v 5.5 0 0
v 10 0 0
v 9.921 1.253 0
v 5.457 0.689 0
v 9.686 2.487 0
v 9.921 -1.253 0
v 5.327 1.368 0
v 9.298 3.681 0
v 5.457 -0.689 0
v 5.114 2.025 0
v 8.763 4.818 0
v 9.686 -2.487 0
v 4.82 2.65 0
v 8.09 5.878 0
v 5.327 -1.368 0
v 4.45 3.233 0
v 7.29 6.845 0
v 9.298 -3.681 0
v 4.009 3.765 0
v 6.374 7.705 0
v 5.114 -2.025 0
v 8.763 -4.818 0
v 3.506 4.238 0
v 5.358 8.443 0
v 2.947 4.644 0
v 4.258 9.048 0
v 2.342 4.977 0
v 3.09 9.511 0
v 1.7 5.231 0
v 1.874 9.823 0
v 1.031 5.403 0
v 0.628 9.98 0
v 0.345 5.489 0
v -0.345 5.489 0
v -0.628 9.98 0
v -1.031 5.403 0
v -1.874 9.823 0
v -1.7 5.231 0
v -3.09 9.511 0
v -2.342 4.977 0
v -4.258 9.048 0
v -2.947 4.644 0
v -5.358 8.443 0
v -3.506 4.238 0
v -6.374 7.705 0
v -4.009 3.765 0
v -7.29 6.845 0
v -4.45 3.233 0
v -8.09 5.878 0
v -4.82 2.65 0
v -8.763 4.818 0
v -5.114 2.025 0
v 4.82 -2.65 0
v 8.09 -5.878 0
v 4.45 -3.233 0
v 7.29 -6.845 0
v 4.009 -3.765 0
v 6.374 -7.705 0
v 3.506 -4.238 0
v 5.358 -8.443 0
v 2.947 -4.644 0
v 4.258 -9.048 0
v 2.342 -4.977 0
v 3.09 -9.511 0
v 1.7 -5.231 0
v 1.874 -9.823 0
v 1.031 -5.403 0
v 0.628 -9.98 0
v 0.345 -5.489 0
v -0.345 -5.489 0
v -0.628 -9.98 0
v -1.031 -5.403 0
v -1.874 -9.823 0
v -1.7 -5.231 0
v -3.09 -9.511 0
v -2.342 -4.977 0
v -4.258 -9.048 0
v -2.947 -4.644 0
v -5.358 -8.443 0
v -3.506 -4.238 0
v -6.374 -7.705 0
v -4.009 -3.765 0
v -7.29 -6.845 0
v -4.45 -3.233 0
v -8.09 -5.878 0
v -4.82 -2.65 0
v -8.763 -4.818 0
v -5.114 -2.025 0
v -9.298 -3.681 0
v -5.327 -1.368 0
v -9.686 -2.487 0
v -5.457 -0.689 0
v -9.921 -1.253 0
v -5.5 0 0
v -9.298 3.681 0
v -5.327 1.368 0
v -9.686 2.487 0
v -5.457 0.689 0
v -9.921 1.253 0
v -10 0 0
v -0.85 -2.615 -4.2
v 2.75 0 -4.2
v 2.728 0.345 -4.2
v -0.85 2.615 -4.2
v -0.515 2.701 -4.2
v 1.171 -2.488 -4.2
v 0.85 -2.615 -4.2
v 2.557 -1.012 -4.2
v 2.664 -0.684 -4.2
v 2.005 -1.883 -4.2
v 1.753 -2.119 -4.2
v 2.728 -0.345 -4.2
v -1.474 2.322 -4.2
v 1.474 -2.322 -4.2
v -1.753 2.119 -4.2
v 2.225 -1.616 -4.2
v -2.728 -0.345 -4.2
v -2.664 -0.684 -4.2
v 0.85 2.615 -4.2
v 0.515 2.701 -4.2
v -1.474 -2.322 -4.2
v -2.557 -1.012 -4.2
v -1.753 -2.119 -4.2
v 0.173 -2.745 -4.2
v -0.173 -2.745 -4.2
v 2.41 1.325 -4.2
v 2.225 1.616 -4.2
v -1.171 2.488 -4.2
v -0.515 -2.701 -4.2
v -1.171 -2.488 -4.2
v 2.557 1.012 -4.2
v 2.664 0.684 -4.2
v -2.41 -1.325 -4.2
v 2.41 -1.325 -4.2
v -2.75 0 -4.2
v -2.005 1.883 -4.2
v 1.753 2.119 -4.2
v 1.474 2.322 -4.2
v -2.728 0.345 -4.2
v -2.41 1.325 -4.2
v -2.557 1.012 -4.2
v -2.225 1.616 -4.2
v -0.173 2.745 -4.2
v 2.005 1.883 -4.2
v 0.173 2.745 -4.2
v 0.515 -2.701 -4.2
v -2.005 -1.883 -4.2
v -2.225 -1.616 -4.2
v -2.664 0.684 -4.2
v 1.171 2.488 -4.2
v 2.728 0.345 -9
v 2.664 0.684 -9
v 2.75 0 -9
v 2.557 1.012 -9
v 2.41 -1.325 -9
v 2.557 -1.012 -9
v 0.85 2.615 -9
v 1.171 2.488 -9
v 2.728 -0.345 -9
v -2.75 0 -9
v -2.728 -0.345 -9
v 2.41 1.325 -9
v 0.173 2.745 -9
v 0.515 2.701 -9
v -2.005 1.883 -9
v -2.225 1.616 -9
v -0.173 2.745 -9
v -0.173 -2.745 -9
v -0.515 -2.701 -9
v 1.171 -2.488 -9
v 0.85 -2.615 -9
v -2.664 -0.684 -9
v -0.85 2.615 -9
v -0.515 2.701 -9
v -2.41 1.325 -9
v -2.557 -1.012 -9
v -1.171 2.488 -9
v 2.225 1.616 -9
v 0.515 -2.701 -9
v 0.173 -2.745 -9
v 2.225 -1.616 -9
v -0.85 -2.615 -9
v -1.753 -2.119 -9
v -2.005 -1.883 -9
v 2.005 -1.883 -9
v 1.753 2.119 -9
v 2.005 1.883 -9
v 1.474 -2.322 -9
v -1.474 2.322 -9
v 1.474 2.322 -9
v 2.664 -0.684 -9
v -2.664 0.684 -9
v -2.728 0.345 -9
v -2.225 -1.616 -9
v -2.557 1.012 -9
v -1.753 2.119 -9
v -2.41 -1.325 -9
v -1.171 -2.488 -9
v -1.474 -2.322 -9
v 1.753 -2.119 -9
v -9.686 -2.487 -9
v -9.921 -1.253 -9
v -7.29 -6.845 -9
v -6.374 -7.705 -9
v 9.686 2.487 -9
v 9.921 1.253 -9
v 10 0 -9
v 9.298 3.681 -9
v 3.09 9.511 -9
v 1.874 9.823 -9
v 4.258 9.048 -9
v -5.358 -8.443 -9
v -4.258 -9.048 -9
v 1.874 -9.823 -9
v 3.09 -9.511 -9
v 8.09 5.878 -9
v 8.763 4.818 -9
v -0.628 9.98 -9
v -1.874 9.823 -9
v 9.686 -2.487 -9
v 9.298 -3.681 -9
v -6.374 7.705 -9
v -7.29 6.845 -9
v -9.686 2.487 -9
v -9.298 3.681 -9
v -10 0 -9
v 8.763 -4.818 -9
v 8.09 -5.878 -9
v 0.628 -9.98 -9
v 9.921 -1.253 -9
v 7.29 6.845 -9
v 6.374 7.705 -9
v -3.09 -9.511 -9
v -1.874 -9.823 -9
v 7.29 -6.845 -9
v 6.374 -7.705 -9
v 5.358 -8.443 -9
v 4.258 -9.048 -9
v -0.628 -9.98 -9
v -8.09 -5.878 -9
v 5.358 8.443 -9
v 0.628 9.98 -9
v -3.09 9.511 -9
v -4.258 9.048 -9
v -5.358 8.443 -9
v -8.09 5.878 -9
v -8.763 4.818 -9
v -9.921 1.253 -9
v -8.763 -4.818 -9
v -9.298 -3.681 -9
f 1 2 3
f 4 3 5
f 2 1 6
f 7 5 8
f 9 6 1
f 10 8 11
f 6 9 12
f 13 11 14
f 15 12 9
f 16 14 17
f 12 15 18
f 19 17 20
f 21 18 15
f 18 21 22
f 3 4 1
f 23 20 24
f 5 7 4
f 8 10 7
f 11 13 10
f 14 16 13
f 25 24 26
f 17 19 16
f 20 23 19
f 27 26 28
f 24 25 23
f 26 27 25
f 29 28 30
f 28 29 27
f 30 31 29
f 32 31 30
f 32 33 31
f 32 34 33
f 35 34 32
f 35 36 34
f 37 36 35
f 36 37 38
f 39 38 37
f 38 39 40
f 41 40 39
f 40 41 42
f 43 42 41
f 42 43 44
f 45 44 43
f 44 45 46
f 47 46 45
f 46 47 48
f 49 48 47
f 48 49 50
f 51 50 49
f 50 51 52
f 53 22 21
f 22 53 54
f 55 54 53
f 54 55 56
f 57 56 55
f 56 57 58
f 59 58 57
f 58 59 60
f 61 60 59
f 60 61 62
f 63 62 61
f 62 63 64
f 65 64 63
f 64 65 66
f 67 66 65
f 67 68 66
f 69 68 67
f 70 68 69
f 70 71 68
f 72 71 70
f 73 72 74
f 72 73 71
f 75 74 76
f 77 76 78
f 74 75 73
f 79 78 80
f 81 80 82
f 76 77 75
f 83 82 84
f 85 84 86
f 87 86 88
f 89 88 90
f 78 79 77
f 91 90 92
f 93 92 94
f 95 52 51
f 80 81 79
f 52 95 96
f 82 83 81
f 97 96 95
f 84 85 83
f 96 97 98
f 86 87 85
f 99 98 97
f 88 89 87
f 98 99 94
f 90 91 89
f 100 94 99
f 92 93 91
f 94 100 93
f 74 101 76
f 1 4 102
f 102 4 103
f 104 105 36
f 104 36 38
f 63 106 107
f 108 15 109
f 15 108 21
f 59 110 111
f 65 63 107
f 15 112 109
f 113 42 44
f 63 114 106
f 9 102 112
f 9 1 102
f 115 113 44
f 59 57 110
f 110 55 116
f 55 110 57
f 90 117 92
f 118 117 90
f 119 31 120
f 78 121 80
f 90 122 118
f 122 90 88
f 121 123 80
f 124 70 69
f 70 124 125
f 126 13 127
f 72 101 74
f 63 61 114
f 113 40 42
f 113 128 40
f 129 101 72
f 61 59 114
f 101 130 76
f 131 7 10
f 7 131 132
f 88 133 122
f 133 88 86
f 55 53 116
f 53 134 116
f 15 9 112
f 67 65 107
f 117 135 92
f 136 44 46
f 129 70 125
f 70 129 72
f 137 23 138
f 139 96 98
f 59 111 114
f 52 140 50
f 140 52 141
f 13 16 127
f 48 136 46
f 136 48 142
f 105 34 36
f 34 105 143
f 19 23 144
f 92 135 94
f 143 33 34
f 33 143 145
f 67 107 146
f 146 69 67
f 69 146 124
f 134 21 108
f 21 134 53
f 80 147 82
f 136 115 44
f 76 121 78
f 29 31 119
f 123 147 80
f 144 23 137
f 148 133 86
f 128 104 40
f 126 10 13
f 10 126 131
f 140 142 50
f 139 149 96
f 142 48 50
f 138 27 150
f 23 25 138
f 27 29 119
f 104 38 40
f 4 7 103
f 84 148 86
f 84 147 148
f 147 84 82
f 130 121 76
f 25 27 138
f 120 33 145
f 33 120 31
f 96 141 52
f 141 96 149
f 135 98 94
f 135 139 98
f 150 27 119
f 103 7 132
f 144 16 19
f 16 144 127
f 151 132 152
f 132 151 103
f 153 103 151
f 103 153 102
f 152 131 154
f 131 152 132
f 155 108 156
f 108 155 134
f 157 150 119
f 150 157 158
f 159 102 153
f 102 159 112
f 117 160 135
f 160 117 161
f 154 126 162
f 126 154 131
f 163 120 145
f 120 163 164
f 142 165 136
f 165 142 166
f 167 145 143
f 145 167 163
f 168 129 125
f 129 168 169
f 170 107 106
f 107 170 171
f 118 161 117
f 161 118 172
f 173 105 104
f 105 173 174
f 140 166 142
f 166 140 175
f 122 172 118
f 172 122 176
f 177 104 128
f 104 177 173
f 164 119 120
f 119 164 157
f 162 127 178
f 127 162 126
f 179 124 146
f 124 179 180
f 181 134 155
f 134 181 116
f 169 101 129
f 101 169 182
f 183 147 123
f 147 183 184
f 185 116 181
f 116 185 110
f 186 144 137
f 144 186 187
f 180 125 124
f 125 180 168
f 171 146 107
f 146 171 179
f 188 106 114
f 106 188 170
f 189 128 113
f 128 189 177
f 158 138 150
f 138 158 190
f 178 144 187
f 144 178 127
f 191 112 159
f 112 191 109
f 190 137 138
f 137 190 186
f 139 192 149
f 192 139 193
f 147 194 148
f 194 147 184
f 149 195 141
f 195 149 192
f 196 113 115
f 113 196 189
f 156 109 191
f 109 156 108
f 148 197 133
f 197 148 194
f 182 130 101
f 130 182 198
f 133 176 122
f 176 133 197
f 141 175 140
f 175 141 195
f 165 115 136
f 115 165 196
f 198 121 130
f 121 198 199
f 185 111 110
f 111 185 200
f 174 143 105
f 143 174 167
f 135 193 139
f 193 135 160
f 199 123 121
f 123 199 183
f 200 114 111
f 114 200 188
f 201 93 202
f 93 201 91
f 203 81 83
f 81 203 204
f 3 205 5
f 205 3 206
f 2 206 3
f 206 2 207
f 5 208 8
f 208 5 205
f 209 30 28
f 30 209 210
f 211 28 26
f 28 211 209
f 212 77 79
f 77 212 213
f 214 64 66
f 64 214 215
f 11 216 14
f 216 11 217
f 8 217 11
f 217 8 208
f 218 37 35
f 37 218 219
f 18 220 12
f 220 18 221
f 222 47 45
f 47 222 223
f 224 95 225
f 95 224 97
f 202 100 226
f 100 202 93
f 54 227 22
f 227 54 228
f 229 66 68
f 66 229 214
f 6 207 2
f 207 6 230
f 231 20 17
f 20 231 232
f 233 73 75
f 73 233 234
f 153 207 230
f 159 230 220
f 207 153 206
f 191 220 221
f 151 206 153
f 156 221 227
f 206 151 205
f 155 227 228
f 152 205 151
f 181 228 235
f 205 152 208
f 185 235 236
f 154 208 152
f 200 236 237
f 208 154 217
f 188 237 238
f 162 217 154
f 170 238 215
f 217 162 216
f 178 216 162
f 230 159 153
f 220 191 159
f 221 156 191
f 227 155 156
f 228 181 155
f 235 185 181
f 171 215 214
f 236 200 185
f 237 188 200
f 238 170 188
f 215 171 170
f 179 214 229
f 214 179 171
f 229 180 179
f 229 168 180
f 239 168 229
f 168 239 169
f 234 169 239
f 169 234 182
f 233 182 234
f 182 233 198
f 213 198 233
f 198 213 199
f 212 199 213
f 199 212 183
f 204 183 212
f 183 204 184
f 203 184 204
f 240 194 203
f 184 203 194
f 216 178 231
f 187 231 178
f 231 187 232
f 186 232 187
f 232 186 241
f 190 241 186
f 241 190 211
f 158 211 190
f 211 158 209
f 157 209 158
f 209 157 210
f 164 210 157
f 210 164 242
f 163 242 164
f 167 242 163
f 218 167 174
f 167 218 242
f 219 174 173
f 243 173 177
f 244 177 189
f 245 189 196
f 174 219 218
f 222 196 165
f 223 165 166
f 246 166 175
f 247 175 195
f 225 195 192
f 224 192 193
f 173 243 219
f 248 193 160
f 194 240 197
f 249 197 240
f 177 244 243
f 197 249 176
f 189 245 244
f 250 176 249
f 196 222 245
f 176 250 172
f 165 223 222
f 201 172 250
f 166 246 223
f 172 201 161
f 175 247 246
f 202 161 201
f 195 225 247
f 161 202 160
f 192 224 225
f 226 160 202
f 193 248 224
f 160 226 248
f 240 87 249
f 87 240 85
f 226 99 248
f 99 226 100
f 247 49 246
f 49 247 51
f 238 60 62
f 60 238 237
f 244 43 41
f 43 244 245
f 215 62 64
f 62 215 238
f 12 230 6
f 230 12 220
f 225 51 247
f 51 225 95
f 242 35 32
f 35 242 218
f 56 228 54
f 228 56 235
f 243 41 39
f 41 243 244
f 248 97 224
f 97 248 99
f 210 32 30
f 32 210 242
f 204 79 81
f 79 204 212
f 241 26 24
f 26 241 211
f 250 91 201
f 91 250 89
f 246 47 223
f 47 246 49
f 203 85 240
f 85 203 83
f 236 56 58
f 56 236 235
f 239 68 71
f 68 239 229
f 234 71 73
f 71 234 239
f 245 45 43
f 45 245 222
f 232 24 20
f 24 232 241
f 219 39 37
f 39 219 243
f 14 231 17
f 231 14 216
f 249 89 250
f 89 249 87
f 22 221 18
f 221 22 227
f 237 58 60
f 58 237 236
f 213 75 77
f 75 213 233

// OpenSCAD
$fn = 50;

difference() {
	union() {
		translate(v = [0, 0, -9.0]) {
			cylinder(h = 9, r = 10.0);
		}
	}
	union() {
		translate(v = [0, 0, 0]) {
			rotate(a = [0, 0, 0]) {
				difference() {
					union() {
						translate(v = [0, 0, -12.0]) {
							cylinder(h = 12, r = 2.25);
						}
						translate(v = [0, 0, -4.2]) {
							cylinder(h = 4.2, r1 = 2.75, r2 = 5.5);
						}
						translate(v = [0, 0, -12.0]) {
							cylinder(h = 12, r = 2.75);
						}
						translate(v = [0, 0, -12.0]) {
							cylinder(h = 12, r = 2.25);
						}
					}
					union();
				}
			}
		}
	}
}
